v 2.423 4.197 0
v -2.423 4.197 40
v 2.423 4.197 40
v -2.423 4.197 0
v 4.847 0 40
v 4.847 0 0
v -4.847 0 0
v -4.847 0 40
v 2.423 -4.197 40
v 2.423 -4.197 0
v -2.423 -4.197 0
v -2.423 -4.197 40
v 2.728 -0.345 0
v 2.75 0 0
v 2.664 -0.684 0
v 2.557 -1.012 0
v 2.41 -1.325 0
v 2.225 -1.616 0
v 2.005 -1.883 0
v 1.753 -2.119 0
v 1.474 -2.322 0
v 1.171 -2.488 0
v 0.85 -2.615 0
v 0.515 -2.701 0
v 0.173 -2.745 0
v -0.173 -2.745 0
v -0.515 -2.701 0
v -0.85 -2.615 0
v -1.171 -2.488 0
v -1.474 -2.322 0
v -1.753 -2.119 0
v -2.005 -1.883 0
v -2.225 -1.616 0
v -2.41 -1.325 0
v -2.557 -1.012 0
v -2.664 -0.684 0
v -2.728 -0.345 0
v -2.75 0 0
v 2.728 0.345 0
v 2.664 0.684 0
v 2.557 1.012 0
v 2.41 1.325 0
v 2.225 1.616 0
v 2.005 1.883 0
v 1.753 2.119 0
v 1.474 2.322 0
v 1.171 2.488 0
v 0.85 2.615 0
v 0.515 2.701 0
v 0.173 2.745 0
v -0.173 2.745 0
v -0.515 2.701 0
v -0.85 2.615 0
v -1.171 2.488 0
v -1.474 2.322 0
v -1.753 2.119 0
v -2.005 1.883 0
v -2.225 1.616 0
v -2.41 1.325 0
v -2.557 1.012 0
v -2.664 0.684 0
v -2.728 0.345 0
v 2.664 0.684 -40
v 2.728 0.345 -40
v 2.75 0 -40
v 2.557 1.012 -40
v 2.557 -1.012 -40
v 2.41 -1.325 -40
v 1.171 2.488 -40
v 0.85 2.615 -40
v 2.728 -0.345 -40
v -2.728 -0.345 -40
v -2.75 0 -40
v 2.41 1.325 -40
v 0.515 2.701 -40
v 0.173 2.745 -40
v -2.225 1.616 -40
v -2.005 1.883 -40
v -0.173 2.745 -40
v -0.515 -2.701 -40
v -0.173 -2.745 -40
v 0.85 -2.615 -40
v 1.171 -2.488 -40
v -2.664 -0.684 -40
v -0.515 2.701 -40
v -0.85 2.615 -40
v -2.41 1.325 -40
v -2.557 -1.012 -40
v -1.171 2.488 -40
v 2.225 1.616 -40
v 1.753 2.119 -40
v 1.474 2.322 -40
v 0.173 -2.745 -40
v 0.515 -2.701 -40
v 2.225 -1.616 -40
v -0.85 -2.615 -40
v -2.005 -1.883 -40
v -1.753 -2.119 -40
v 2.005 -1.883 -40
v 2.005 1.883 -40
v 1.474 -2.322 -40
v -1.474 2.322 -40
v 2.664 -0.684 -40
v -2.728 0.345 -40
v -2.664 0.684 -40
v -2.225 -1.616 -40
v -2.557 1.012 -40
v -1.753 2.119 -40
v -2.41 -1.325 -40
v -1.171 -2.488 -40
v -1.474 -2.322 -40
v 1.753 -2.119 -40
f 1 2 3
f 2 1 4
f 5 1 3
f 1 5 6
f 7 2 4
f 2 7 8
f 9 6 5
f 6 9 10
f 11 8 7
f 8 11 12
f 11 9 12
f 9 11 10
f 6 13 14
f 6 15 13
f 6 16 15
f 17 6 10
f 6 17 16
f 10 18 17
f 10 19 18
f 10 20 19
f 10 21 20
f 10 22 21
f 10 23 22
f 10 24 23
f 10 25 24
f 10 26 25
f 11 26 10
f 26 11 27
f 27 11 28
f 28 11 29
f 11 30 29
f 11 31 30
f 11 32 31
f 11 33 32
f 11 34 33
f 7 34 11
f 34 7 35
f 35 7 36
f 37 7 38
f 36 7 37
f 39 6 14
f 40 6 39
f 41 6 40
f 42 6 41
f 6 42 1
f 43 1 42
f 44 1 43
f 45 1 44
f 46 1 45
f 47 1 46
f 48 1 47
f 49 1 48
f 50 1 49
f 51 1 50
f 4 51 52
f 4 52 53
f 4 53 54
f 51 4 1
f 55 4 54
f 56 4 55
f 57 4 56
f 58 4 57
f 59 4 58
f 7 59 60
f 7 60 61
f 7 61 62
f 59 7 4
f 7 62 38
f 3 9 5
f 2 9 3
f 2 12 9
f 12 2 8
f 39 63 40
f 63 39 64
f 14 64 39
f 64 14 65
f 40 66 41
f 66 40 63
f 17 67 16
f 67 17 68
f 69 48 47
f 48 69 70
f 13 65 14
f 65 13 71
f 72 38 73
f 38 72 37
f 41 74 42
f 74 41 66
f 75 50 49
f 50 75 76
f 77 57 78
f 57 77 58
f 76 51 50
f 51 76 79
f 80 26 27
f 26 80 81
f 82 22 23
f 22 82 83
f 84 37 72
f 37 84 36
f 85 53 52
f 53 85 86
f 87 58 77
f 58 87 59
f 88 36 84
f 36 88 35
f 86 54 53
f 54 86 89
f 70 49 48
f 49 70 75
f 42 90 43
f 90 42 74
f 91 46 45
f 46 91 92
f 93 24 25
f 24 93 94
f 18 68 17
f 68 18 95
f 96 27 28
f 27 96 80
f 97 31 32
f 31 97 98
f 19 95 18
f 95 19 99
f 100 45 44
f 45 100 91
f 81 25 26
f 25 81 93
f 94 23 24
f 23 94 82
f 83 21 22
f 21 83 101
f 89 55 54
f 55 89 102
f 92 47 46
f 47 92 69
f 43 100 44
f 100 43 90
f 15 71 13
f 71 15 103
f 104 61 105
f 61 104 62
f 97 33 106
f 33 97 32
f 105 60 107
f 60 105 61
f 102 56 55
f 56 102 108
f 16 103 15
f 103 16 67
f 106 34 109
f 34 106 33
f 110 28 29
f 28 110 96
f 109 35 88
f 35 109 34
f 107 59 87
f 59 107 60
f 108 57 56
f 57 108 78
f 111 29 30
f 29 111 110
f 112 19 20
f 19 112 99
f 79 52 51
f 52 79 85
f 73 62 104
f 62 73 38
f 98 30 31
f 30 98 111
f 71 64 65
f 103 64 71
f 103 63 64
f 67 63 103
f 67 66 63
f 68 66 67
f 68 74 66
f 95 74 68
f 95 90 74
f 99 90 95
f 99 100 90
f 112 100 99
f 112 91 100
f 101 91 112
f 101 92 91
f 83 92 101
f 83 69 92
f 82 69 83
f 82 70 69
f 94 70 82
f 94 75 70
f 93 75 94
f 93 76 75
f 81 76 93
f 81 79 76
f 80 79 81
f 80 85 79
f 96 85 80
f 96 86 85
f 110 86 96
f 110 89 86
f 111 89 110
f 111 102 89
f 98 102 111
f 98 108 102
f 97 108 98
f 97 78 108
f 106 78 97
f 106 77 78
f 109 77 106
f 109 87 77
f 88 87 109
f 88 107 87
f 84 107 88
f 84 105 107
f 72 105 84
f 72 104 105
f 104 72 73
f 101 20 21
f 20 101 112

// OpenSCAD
$fn = 50;


difference() {
	union() {
		linear_extrude(height = 40) {
			polygon(points = [[4.8468000000, 0.0000000000], [2.4234000000, 4.1974519271], [-2.4234000000, 4.1974519271], [-4.8468000000, 0.0000000000], [-2.4234000000, -4.1974519271], [2.4234000000, -4.1974519271]]);
		}
		translate(v = [0, 0, -40]) {
			cylinder(h = 40, r = 2.7500000000);
		}
	}
	union();
}
